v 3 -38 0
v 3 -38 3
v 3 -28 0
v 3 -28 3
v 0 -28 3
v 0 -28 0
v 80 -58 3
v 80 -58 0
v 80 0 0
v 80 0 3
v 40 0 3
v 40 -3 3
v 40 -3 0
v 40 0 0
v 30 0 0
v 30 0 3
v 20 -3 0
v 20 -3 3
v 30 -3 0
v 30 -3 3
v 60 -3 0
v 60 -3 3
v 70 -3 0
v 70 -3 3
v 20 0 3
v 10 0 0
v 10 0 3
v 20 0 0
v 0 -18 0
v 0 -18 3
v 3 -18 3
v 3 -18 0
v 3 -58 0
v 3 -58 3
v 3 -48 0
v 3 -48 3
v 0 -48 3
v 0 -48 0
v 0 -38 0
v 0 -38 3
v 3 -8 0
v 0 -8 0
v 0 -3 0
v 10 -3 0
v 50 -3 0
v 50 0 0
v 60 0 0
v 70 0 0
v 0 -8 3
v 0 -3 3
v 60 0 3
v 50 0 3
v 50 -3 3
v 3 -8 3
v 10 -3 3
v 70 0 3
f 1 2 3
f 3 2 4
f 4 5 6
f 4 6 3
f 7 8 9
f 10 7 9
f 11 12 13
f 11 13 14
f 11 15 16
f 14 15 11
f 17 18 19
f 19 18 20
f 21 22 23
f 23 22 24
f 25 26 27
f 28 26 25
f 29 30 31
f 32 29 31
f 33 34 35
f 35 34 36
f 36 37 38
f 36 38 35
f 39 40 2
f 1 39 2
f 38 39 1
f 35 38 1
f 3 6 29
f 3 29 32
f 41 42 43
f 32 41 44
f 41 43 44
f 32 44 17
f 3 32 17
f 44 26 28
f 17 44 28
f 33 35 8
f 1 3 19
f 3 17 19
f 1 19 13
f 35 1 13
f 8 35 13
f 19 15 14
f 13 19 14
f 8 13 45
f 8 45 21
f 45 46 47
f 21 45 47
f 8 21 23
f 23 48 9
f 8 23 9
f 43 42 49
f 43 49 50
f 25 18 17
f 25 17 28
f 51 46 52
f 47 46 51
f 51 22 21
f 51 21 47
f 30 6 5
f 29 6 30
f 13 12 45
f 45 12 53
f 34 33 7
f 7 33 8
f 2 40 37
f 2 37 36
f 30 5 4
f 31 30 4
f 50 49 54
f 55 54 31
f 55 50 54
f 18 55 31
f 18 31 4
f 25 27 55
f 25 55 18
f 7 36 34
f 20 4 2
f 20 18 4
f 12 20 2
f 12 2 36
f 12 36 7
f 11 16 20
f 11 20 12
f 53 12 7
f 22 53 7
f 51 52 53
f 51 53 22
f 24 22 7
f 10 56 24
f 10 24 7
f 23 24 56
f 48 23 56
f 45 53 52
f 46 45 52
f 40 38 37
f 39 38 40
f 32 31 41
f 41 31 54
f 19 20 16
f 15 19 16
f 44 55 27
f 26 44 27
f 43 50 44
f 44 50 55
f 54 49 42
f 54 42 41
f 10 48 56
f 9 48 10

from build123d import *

# Parameters (mm, degrees)
ESQUISSE1_W                = 80
ESQUISSE1_H                = 58
BOSS_EXTRU_1_DEPTH         = 3
ESQUISSE2_W                = 10
ESQUISSE2_H                = 3
ENL_V_MAT_EXTRU_1_DEPTH    = 4
R_P_TITION_LIN_AIRE1_COUNT = 4
R_P_TITION_LIN_AIRE1_PITCH = 20
ESQUISSE3_W                = 3
ESQUISSE3_H                = 10
ENL_V_MAT_EXTRU_2_DEPTH    = 4
R_P_TITION_LIN_AIRE2_COUNT = 3
R_P_TITION_LIN_AIRE2_PITCH = 20


with BuildPart() as part:
    # Esquisse1 → Boss.-Extru.1 (new body)
    with BuildSketch(Plane.XY):
        with Locations((40, -29)):
            Rectangle(ESQUISSE1_W, ESQUISSE1_H)
    extrude(amount=BOSS_EXTRU_1_DEPTH)

    # Esquisse2 → Enlèv. mat.-Extru.1 (cut, through all)
    with BuildSketch(Plane.XY.offset(3)):
        with Locations((5, -1.5)):
            Rectangle(ESQUISSE2_W, ESQUISSE2_H)
    enl_v_mat_extru_1 = extrude(amount=-ENL_V_MAT_EXTRU_1_DEPTH, mode=Mode.SUBTRACT)

    # Répétition linéaire1: Enlèv. mat.-Extru.1 ×4
    with Locations(*[(i * R_P_TITION_LIN_AIRE1_PITCH, 0, 0) for i in range(1, R_P_TITION_LIN_AIRE1_COUNT)]):
        add(enl_v_mat_extru_1, mode=Mode.SUBTRACT)

    # Esquisse3 → Enlèv. mat.-Extru.2 (cut, through all)
    with BuildSketch(Plane.XY.offset(3)):
        with Locations((1.5, -53)):
            Rectangle(ESQUISSE3_W, ESQUISSE3_H)
    enl_v_mat_extru_2 = extrude(amount=-ENL_V_MAT_EXTRU_2_DEPTH, mode=Mode.SUBTRACT)

    # Répétition linéaire2: Enlèv. mat.-Extru.2 ×3
    with Locations(*[(0, i * R_P_TITION_LIN_AIRE2_PITCH, 0) for i in range(1, R_P_TITION_LIN_AIRE2_COUNT)]):
        add(enl_v_mat_extru_2, mode=Mode.SUBTRACT)


solid = part.part
